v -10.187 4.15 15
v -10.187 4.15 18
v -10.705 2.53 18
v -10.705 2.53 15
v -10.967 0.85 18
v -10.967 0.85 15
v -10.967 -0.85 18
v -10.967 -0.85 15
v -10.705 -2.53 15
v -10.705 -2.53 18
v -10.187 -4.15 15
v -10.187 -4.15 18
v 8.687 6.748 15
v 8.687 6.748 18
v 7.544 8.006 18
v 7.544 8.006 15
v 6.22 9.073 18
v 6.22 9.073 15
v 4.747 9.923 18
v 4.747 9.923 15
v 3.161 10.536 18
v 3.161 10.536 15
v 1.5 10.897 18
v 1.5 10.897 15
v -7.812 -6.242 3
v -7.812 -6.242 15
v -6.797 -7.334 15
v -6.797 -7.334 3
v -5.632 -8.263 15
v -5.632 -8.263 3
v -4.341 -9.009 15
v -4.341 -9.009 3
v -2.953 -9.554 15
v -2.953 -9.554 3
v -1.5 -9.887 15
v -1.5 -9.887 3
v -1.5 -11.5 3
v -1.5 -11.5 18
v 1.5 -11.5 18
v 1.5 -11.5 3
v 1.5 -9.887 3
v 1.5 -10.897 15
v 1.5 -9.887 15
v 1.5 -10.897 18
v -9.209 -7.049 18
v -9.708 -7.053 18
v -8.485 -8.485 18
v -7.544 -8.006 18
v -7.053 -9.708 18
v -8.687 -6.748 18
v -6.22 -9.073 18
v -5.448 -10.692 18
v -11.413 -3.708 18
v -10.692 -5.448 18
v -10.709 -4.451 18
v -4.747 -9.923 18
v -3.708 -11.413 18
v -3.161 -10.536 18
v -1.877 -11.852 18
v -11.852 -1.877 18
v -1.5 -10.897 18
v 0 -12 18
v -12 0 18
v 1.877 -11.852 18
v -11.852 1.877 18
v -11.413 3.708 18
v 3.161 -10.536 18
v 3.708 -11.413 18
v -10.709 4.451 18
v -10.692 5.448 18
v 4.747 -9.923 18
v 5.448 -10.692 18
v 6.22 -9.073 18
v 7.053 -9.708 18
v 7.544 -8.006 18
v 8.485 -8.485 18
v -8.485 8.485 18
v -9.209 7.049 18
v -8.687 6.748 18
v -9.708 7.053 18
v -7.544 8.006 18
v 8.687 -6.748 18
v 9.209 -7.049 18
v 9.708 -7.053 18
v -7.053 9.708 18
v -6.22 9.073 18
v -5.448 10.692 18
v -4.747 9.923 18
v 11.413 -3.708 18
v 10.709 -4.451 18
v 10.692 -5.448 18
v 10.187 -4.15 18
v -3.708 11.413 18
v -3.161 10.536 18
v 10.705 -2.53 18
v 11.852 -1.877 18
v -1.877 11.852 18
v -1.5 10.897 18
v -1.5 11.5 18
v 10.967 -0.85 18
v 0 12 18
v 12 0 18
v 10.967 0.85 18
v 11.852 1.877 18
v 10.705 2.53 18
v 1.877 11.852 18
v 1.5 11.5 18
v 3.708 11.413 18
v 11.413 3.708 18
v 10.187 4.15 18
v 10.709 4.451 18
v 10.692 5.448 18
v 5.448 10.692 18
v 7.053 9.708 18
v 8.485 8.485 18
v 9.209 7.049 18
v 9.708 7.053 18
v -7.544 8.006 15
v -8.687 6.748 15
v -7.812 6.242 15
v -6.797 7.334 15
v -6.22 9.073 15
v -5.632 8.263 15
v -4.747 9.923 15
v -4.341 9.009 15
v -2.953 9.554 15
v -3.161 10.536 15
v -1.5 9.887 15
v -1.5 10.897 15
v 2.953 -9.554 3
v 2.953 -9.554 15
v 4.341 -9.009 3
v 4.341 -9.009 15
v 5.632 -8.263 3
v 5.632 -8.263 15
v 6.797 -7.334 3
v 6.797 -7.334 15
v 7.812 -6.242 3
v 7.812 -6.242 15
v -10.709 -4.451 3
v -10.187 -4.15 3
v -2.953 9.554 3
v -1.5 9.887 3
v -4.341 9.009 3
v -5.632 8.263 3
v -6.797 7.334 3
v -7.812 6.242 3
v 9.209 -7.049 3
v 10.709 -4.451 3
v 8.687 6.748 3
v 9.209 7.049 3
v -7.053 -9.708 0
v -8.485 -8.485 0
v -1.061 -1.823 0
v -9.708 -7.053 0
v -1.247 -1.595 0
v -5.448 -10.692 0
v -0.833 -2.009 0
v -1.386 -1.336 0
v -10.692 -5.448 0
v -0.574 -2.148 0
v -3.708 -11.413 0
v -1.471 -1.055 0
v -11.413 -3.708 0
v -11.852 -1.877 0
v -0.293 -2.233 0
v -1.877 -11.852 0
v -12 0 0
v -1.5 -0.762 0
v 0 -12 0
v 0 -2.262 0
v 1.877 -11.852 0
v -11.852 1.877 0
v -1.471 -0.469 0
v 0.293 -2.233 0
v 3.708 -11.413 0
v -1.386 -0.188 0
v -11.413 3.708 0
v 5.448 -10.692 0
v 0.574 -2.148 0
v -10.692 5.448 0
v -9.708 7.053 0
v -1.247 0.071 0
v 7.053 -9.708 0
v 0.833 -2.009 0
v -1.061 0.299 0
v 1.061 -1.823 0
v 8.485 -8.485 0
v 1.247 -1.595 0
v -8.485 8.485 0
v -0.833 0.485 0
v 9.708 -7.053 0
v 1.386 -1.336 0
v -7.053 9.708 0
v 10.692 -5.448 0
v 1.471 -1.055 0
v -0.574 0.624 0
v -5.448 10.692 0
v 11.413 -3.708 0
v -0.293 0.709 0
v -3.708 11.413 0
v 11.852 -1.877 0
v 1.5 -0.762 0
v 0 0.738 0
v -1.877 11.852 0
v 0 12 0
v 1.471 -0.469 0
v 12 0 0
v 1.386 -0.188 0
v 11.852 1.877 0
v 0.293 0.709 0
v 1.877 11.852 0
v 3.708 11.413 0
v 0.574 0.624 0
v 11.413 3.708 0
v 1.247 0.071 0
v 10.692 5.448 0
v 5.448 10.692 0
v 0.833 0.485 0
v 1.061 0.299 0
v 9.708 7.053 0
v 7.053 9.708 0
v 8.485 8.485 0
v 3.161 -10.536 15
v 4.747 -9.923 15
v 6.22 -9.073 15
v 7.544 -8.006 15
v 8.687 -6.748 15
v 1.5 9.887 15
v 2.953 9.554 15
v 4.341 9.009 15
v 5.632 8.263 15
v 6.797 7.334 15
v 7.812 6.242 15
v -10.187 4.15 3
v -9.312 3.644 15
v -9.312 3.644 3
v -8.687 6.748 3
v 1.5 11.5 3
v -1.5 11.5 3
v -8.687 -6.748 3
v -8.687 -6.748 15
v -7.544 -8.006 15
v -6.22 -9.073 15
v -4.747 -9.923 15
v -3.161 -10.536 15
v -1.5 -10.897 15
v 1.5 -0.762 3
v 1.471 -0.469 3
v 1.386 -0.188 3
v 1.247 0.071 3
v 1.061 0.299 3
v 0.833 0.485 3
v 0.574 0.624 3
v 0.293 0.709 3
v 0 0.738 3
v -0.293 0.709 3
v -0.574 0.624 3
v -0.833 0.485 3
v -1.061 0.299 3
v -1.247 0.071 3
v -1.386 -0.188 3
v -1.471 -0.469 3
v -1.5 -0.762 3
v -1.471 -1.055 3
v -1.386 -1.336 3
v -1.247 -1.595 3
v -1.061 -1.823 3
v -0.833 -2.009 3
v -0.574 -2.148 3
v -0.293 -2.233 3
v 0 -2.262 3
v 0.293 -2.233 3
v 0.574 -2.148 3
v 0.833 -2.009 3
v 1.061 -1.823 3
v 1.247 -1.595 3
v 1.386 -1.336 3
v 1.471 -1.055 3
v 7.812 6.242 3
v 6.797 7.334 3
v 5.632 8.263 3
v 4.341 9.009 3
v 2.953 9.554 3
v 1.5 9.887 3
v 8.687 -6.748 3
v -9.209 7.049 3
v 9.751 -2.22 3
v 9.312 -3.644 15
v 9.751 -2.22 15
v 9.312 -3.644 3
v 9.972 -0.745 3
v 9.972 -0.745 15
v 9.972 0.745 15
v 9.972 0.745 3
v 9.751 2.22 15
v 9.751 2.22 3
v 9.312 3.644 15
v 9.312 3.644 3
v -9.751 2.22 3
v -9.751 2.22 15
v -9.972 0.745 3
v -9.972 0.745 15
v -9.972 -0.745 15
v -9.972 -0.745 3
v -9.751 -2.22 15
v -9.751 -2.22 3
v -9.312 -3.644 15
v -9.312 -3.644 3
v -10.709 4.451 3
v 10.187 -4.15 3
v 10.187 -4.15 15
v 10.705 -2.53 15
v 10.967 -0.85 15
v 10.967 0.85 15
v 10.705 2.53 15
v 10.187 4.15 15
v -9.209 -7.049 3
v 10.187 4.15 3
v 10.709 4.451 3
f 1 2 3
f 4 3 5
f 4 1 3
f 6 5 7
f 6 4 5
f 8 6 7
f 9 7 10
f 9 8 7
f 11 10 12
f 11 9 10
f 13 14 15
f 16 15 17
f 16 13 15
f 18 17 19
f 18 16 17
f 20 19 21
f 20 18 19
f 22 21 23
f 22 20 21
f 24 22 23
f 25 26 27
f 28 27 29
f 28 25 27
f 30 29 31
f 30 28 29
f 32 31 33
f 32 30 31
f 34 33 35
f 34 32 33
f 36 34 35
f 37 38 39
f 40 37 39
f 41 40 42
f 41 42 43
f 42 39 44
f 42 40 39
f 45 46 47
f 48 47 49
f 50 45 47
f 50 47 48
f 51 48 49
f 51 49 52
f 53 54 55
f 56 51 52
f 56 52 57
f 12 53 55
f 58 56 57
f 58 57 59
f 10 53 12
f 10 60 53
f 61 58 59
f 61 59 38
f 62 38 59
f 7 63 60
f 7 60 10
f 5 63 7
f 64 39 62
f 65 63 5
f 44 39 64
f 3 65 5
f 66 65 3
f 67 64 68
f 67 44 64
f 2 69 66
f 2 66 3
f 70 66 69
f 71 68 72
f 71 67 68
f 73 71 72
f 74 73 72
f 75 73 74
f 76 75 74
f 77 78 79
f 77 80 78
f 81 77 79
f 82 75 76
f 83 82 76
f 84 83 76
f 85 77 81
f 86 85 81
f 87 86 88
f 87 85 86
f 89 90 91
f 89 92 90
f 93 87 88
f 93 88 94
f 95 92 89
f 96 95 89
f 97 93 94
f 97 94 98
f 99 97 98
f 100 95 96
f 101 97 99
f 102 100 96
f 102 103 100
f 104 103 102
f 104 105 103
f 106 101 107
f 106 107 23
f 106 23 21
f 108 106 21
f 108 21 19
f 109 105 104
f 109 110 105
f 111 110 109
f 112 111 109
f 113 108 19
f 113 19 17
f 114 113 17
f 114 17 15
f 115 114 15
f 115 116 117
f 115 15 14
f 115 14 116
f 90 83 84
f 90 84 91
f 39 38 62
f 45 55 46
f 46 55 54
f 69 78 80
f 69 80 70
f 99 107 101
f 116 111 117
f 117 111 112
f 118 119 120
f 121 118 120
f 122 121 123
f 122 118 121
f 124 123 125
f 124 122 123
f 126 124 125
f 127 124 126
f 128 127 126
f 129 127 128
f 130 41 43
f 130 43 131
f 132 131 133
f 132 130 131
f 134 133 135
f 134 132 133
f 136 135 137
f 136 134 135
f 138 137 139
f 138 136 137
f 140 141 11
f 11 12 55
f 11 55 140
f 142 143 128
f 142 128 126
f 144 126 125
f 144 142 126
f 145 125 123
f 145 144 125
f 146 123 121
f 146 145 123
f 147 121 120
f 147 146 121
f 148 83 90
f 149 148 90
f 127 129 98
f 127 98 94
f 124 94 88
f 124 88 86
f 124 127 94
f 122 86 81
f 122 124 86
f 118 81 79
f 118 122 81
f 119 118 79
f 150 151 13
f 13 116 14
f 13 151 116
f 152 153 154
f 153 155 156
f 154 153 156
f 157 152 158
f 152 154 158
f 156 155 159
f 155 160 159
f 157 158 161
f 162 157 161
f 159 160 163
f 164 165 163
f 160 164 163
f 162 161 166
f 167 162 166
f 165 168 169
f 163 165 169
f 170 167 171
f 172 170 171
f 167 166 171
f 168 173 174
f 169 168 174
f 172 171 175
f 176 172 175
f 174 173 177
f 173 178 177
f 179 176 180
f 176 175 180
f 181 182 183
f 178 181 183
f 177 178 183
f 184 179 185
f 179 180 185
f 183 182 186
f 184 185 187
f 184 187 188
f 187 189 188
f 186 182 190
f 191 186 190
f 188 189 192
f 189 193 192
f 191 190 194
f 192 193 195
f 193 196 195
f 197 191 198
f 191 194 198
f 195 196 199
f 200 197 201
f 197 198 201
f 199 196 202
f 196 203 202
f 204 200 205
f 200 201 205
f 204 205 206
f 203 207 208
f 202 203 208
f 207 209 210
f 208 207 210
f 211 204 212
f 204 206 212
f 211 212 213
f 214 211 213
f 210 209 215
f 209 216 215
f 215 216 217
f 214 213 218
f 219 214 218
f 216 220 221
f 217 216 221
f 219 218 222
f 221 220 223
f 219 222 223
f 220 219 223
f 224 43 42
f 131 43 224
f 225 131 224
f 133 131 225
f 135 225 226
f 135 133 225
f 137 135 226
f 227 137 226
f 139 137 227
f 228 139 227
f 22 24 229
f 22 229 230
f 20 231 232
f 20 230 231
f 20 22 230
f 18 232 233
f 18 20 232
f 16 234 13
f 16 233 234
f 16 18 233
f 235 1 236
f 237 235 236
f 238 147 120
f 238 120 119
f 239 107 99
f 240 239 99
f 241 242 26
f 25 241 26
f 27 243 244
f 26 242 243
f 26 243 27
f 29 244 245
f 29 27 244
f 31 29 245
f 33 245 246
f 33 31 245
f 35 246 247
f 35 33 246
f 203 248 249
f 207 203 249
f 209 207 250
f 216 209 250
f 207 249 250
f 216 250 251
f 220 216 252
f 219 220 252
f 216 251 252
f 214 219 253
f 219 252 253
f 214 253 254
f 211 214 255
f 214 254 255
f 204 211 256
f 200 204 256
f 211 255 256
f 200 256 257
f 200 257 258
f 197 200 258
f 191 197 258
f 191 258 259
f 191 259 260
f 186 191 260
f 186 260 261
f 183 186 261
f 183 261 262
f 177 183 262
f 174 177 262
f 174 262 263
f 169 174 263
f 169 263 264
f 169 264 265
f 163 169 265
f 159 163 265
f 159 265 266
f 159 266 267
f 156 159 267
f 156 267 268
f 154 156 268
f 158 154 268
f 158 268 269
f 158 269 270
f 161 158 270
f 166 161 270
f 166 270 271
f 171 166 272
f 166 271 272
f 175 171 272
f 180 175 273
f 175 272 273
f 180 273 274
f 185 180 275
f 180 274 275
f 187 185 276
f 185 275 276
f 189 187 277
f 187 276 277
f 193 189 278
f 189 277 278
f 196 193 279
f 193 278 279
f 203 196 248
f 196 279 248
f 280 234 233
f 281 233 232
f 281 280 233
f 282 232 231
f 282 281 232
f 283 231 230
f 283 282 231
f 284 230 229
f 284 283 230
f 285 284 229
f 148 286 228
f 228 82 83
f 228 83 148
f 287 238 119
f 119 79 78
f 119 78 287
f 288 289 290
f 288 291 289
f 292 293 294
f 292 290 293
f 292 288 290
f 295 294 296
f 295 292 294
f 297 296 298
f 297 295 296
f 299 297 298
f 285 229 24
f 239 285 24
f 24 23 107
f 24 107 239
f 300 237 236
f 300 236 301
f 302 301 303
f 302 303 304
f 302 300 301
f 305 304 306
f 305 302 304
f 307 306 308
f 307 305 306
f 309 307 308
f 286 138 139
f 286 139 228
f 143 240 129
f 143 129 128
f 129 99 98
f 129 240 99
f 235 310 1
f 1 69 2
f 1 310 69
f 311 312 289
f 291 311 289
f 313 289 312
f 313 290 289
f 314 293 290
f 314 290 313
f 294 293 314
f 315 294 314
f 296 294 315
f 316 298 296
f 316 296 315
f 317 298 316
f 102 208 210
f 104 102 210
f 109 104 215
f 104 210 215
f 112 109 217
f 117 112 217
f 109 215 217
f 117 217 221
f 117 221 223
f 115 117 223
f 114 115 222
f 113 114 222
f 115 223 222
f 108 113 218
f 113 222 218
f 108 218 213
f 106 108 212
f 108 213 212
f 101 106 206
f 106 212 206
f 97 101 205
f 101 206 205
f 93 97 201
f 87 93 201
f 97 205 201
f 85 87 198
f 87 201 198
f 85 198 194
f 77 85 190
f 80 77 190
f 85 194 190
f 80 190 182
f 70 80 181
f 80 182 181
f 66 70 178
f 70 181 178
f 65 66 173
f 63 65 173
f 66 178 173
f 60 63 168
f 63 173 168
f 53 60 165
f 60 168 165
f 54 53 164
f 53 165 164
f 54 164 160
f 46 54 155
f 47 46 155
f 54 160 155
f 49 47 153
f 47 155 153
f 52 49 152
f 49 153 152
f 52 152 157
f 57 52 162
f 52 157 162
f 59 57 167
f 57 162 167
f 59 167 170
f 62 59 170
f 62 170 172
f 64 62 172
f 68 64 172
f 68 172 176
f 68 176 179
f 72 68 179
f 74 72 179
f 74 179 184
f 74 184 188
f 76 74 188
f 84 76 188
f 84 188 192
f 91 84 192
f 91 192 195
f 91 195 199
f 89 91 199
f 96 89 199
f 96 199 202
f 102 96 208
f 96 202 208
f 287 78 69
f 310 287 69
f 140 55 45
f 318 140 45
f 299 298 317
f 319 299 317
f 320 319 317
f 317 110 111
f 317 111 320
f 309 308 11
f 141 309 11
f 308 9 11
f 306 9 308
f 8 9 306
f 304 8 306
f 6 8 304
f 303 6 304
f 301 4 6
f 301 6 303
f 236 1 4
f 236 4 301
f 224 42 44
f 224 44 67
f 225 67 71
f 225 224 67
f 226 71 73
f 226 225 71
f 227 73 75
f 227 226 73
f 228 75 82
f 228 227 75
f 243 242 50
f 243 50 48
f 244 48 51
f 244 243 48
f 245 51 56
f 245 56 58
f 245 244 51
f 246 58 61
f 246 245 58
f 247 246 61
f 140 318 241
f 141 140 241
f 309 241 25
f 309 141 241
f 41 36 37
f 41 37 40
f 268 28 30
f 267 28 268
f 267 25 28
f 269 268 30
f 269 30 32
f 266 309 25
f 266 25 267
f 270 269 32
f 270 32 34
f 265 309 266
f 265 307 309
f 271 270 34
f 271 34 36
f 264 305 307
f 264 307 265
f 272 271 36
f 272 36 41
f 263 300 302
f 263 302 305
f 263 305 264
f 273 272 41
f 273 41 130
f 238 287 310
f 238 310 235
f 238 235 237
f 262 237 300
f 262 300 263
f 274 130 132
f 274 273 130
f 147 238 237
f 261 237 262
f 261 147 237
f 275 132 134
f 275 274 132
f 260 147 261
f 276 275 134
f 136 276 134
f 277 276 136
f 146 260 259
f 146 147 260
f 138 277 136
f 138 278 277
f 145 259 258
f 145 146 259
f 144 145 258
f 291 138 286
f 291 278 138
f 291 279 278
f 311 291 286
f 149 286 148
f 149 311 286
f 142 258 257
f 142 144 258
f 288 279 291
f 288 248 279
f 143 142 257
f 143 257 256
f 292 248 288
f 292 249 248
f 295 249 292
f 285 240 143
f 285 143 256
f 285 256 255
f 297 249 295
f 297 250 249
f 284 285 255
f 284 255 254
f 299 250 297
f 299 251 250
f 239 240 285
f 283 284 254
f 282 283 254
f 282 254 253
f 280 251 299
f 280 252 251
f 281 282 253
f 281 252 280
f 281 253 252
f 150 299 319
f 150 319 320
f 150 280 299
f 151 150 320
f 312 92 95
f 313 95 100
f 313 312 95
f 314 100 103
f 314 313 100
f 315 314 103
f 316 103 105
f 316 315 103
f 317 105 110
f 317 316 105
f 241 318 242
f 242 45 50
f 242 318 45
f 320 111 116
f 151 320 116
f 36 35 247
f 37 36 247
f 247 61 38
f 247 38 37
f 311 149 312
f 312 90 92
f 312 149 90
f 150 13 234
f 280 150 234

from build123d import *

# Parameters (mm, degrees)
F0_R     = 10
F1_DEPTH = 3
F0_R_2   = 11
F2_DEPTH = 15
F0_R_3   = 12
F3_DEPTH = 18
F4_R     = 1.5
F5_DEPTH = 3
F7_DEPTH = 15


with BuildPart() as f1:
    # F0 (on Top) → F1 (new body)
    with BuildSketch(Plane.XY):
        Circle(F0_R)
    extrude(amount=F1_DEPTH)

    # F0 (on Top) → F2 (join)
    with BuildSketch(Plane.XY):
        Circle(F0_R_2)
        Circle(F0_R, mode=Mode.SUBTRACT)
    extrude(amount=F2_DEPTH)

    # F0 (on Top) → F3 (join)
    with BuildSketch(Plane.XY):
        Circle(F0_R_3)
        Circle(F0_R_2, mode=Mode.SUBTRACT)
    extrude(amount=F3_DEPTH)

    # F4 (on face) → F5 (cut)
    with BuildSketch(Plane.XY.offset(3)):
        with Locations((0, -0.7618688396)):
            Circle(F4_R)
    extrude(amount=-F5_DEPTH, mode=Mode.SUBTRACT)

    # F6 (on face) → F7 (cut)
    with BuildSketch(Plane.XY.offset(18)):
        with BuildLine():
            Line((0, 1.7320508076), (1.5, 2.5980762114))
            Line((1.5, 2.5980762114), (1.5, 10.8972473589))
            ThreePointArc((1.5, 10.8972473589), (0, 11), (-1.5, 10.8972473589))
            Line((-1.5, 10.8972473589), (-1.5, 2.5980762114))
            Line((-1.5, 2.5980762114), (0, 1.7320508076))
        make_face()
        with BuildLine():
            ThreePointArc((-1.5, 10.8972473589), (0, 11), (1.5, 10.8972473589))
            Line((1.5, 10.8972473589), (1.5, 11.5))
            Line((1.5, 11.5), (-1.5, 11.5))
            Line((-1.5, 11.5), (-1.5, 10.8972473589))
        make_face()
        with BuildLine():
            Line((-10.7092921435, 4.4509618943), (-10.1872930441, 4.1495855737))
            ThreePointArc((-10.1872930441, 4.1495855737), (-9.5262794416, 5.5), (-8.6872930441, 6.7476617851))
            Line((-8.6872930441, 6.7476617851), (-9.2092921435, 7.0490381057))
            Line((-9.2092921435, 7.0490381057), (-10.7092921435, 4.4509618943))
        make_face()
        with BuildLine():
            Line((-3, 0), (-1.5, 0.8660254038))
            Line((-1.5, 0.8660254038), (-1.5, 2.5980762114))
            Line((-1.5, 2.5980762114), (-8.6872930441, 6.7476617851))
            ThreePointArc((-8.6872930441, 6.7476617851), (-9.5262794416, 5.5), (-10.1872930441, 4.1495855737))
            Line((-10.1872930441, 4.1495855737), (-3, 0))
        make_face()
        with BuildLine():
            Line((-8.6872930441, -6.7476617851), (-1.5, -2.5980762114))
            Line((-1.5, -2.5980762114), (-1.5, -0.8660254038))
            Line((-1.5, -0.8660254038), (-3, 0))
            Line((-3, 0), (-10.1872930441, -4.1495855737))
            ThreePointArc((-10.1872930441, -4.1495855737), (-9.5262794416, -5.5), (-8.6872930441, -6.7476617851))
        make_face()
        with BuildLine():
            ThreePointArc((-1.5, -10.8972473589), (0, -11), (1.5, -10.8972473589))
            Line((1.5, -10.8972473589), (1.5, -2.5980762114))
            Line((1.5, -2.5980762114), (0, -1.7320508076))
            Line((0, -1.7320508076), (-1.5, -2.5980762114))
            Line((-1.5, -2.5980762114), (-1.5, -10.8972473589))
        make_face()
        with BuildLine():
            Line((1.5, -0.8660254038), (1.5, -2.5980762114))
            Line((1.5, -2.5980762114), (8.6872930441, -6.7476617851))
            ThreePointArc((8.6872930441, -6.7476617851), (9.5262794416, -5.5), (10.1872930441, -4.1495855737))
            Line((10.1872930441, -4.1495855737), (3, 0))
            Line((3, 0), (1.5, -0.8660254038))
        make_face()
        with BuildLine():
            Line((1.5, 2.5980762114), (1.5, 0.8660254038))
            Line((1.5, 0.8660254038), (3, 0))
            Line((3, 0), (10.1872930441, 4.1495855737))
            ThreePointArc((10.1872930441, 4.1495855737), (9.5262794416, 5.5), (8.6872930441, 6.7476617851))
            Line((8.6872930441, 6.7476617851), (1.5, 2.5980762114))
        make_face()
        with BuildLine():
            ThreePointArc((8.6872930441, 6.7476617851), (9.5262794416, 5.5), (10.1872930441, 4.1495855737))
            Line((10.1872930441, 4.1495855737), (10.7092921435, 4.4509618943))
            Line((10.7092921435, 4.4509618943), (9.2092921435, 7.0490381057))
            Line((9.2092921435, 7.0490381057), (8.6872930441, 6.7476617851))
        make_face()
        with BuildLine():
            ThreePointArc((10.1872930441, -4.1495855737), (9.5262794416, -5.5), (8.6872930441, -6.7476617851))
            Line((8.6872930441, -6.7476617851), (9.2092921435, -7.0490381057))
            Line((9.2092921435, -7.0490381057), (10.7092921435, -4.4509618943))
            Line((10.7092921435, -4.4509618943), (10.1872930441, -4.1495855737))
        make_face()
        with BuildLine():
            Line((-1.5, -11.5), (1.5, -11.5))
            Line((1.5, -11.5), (1.5, -10.8972473589))
            ThreePointArc((1.5, -10.8972473589), (0, -11), (-1.5, -10.8972473589))
            Line((-1.5, -10.8972473589), (-1.5, -11.5))
        make_face()
        with BuildLine():
            Line((-9.2092921435, -7.0490381057), (-8.6872930441, -6.7476617851))
            ThreePointArc((-8.6872930441, -6.7476617851), (-9.5262794416, -5.5), (-10.1872930441, -4.1495855737))
            Line((-10.1872930441, -4.1495855737), (-10.7092921435, -4.4509618943))
            Line((-10.7092921435, -4.4509618943), (-9.2092921435, -7.0490381057))
        make_face()
    extrude(amount=-F7_DEPTH, mode=Mode.SUBTRACT)


solid = f1.part
